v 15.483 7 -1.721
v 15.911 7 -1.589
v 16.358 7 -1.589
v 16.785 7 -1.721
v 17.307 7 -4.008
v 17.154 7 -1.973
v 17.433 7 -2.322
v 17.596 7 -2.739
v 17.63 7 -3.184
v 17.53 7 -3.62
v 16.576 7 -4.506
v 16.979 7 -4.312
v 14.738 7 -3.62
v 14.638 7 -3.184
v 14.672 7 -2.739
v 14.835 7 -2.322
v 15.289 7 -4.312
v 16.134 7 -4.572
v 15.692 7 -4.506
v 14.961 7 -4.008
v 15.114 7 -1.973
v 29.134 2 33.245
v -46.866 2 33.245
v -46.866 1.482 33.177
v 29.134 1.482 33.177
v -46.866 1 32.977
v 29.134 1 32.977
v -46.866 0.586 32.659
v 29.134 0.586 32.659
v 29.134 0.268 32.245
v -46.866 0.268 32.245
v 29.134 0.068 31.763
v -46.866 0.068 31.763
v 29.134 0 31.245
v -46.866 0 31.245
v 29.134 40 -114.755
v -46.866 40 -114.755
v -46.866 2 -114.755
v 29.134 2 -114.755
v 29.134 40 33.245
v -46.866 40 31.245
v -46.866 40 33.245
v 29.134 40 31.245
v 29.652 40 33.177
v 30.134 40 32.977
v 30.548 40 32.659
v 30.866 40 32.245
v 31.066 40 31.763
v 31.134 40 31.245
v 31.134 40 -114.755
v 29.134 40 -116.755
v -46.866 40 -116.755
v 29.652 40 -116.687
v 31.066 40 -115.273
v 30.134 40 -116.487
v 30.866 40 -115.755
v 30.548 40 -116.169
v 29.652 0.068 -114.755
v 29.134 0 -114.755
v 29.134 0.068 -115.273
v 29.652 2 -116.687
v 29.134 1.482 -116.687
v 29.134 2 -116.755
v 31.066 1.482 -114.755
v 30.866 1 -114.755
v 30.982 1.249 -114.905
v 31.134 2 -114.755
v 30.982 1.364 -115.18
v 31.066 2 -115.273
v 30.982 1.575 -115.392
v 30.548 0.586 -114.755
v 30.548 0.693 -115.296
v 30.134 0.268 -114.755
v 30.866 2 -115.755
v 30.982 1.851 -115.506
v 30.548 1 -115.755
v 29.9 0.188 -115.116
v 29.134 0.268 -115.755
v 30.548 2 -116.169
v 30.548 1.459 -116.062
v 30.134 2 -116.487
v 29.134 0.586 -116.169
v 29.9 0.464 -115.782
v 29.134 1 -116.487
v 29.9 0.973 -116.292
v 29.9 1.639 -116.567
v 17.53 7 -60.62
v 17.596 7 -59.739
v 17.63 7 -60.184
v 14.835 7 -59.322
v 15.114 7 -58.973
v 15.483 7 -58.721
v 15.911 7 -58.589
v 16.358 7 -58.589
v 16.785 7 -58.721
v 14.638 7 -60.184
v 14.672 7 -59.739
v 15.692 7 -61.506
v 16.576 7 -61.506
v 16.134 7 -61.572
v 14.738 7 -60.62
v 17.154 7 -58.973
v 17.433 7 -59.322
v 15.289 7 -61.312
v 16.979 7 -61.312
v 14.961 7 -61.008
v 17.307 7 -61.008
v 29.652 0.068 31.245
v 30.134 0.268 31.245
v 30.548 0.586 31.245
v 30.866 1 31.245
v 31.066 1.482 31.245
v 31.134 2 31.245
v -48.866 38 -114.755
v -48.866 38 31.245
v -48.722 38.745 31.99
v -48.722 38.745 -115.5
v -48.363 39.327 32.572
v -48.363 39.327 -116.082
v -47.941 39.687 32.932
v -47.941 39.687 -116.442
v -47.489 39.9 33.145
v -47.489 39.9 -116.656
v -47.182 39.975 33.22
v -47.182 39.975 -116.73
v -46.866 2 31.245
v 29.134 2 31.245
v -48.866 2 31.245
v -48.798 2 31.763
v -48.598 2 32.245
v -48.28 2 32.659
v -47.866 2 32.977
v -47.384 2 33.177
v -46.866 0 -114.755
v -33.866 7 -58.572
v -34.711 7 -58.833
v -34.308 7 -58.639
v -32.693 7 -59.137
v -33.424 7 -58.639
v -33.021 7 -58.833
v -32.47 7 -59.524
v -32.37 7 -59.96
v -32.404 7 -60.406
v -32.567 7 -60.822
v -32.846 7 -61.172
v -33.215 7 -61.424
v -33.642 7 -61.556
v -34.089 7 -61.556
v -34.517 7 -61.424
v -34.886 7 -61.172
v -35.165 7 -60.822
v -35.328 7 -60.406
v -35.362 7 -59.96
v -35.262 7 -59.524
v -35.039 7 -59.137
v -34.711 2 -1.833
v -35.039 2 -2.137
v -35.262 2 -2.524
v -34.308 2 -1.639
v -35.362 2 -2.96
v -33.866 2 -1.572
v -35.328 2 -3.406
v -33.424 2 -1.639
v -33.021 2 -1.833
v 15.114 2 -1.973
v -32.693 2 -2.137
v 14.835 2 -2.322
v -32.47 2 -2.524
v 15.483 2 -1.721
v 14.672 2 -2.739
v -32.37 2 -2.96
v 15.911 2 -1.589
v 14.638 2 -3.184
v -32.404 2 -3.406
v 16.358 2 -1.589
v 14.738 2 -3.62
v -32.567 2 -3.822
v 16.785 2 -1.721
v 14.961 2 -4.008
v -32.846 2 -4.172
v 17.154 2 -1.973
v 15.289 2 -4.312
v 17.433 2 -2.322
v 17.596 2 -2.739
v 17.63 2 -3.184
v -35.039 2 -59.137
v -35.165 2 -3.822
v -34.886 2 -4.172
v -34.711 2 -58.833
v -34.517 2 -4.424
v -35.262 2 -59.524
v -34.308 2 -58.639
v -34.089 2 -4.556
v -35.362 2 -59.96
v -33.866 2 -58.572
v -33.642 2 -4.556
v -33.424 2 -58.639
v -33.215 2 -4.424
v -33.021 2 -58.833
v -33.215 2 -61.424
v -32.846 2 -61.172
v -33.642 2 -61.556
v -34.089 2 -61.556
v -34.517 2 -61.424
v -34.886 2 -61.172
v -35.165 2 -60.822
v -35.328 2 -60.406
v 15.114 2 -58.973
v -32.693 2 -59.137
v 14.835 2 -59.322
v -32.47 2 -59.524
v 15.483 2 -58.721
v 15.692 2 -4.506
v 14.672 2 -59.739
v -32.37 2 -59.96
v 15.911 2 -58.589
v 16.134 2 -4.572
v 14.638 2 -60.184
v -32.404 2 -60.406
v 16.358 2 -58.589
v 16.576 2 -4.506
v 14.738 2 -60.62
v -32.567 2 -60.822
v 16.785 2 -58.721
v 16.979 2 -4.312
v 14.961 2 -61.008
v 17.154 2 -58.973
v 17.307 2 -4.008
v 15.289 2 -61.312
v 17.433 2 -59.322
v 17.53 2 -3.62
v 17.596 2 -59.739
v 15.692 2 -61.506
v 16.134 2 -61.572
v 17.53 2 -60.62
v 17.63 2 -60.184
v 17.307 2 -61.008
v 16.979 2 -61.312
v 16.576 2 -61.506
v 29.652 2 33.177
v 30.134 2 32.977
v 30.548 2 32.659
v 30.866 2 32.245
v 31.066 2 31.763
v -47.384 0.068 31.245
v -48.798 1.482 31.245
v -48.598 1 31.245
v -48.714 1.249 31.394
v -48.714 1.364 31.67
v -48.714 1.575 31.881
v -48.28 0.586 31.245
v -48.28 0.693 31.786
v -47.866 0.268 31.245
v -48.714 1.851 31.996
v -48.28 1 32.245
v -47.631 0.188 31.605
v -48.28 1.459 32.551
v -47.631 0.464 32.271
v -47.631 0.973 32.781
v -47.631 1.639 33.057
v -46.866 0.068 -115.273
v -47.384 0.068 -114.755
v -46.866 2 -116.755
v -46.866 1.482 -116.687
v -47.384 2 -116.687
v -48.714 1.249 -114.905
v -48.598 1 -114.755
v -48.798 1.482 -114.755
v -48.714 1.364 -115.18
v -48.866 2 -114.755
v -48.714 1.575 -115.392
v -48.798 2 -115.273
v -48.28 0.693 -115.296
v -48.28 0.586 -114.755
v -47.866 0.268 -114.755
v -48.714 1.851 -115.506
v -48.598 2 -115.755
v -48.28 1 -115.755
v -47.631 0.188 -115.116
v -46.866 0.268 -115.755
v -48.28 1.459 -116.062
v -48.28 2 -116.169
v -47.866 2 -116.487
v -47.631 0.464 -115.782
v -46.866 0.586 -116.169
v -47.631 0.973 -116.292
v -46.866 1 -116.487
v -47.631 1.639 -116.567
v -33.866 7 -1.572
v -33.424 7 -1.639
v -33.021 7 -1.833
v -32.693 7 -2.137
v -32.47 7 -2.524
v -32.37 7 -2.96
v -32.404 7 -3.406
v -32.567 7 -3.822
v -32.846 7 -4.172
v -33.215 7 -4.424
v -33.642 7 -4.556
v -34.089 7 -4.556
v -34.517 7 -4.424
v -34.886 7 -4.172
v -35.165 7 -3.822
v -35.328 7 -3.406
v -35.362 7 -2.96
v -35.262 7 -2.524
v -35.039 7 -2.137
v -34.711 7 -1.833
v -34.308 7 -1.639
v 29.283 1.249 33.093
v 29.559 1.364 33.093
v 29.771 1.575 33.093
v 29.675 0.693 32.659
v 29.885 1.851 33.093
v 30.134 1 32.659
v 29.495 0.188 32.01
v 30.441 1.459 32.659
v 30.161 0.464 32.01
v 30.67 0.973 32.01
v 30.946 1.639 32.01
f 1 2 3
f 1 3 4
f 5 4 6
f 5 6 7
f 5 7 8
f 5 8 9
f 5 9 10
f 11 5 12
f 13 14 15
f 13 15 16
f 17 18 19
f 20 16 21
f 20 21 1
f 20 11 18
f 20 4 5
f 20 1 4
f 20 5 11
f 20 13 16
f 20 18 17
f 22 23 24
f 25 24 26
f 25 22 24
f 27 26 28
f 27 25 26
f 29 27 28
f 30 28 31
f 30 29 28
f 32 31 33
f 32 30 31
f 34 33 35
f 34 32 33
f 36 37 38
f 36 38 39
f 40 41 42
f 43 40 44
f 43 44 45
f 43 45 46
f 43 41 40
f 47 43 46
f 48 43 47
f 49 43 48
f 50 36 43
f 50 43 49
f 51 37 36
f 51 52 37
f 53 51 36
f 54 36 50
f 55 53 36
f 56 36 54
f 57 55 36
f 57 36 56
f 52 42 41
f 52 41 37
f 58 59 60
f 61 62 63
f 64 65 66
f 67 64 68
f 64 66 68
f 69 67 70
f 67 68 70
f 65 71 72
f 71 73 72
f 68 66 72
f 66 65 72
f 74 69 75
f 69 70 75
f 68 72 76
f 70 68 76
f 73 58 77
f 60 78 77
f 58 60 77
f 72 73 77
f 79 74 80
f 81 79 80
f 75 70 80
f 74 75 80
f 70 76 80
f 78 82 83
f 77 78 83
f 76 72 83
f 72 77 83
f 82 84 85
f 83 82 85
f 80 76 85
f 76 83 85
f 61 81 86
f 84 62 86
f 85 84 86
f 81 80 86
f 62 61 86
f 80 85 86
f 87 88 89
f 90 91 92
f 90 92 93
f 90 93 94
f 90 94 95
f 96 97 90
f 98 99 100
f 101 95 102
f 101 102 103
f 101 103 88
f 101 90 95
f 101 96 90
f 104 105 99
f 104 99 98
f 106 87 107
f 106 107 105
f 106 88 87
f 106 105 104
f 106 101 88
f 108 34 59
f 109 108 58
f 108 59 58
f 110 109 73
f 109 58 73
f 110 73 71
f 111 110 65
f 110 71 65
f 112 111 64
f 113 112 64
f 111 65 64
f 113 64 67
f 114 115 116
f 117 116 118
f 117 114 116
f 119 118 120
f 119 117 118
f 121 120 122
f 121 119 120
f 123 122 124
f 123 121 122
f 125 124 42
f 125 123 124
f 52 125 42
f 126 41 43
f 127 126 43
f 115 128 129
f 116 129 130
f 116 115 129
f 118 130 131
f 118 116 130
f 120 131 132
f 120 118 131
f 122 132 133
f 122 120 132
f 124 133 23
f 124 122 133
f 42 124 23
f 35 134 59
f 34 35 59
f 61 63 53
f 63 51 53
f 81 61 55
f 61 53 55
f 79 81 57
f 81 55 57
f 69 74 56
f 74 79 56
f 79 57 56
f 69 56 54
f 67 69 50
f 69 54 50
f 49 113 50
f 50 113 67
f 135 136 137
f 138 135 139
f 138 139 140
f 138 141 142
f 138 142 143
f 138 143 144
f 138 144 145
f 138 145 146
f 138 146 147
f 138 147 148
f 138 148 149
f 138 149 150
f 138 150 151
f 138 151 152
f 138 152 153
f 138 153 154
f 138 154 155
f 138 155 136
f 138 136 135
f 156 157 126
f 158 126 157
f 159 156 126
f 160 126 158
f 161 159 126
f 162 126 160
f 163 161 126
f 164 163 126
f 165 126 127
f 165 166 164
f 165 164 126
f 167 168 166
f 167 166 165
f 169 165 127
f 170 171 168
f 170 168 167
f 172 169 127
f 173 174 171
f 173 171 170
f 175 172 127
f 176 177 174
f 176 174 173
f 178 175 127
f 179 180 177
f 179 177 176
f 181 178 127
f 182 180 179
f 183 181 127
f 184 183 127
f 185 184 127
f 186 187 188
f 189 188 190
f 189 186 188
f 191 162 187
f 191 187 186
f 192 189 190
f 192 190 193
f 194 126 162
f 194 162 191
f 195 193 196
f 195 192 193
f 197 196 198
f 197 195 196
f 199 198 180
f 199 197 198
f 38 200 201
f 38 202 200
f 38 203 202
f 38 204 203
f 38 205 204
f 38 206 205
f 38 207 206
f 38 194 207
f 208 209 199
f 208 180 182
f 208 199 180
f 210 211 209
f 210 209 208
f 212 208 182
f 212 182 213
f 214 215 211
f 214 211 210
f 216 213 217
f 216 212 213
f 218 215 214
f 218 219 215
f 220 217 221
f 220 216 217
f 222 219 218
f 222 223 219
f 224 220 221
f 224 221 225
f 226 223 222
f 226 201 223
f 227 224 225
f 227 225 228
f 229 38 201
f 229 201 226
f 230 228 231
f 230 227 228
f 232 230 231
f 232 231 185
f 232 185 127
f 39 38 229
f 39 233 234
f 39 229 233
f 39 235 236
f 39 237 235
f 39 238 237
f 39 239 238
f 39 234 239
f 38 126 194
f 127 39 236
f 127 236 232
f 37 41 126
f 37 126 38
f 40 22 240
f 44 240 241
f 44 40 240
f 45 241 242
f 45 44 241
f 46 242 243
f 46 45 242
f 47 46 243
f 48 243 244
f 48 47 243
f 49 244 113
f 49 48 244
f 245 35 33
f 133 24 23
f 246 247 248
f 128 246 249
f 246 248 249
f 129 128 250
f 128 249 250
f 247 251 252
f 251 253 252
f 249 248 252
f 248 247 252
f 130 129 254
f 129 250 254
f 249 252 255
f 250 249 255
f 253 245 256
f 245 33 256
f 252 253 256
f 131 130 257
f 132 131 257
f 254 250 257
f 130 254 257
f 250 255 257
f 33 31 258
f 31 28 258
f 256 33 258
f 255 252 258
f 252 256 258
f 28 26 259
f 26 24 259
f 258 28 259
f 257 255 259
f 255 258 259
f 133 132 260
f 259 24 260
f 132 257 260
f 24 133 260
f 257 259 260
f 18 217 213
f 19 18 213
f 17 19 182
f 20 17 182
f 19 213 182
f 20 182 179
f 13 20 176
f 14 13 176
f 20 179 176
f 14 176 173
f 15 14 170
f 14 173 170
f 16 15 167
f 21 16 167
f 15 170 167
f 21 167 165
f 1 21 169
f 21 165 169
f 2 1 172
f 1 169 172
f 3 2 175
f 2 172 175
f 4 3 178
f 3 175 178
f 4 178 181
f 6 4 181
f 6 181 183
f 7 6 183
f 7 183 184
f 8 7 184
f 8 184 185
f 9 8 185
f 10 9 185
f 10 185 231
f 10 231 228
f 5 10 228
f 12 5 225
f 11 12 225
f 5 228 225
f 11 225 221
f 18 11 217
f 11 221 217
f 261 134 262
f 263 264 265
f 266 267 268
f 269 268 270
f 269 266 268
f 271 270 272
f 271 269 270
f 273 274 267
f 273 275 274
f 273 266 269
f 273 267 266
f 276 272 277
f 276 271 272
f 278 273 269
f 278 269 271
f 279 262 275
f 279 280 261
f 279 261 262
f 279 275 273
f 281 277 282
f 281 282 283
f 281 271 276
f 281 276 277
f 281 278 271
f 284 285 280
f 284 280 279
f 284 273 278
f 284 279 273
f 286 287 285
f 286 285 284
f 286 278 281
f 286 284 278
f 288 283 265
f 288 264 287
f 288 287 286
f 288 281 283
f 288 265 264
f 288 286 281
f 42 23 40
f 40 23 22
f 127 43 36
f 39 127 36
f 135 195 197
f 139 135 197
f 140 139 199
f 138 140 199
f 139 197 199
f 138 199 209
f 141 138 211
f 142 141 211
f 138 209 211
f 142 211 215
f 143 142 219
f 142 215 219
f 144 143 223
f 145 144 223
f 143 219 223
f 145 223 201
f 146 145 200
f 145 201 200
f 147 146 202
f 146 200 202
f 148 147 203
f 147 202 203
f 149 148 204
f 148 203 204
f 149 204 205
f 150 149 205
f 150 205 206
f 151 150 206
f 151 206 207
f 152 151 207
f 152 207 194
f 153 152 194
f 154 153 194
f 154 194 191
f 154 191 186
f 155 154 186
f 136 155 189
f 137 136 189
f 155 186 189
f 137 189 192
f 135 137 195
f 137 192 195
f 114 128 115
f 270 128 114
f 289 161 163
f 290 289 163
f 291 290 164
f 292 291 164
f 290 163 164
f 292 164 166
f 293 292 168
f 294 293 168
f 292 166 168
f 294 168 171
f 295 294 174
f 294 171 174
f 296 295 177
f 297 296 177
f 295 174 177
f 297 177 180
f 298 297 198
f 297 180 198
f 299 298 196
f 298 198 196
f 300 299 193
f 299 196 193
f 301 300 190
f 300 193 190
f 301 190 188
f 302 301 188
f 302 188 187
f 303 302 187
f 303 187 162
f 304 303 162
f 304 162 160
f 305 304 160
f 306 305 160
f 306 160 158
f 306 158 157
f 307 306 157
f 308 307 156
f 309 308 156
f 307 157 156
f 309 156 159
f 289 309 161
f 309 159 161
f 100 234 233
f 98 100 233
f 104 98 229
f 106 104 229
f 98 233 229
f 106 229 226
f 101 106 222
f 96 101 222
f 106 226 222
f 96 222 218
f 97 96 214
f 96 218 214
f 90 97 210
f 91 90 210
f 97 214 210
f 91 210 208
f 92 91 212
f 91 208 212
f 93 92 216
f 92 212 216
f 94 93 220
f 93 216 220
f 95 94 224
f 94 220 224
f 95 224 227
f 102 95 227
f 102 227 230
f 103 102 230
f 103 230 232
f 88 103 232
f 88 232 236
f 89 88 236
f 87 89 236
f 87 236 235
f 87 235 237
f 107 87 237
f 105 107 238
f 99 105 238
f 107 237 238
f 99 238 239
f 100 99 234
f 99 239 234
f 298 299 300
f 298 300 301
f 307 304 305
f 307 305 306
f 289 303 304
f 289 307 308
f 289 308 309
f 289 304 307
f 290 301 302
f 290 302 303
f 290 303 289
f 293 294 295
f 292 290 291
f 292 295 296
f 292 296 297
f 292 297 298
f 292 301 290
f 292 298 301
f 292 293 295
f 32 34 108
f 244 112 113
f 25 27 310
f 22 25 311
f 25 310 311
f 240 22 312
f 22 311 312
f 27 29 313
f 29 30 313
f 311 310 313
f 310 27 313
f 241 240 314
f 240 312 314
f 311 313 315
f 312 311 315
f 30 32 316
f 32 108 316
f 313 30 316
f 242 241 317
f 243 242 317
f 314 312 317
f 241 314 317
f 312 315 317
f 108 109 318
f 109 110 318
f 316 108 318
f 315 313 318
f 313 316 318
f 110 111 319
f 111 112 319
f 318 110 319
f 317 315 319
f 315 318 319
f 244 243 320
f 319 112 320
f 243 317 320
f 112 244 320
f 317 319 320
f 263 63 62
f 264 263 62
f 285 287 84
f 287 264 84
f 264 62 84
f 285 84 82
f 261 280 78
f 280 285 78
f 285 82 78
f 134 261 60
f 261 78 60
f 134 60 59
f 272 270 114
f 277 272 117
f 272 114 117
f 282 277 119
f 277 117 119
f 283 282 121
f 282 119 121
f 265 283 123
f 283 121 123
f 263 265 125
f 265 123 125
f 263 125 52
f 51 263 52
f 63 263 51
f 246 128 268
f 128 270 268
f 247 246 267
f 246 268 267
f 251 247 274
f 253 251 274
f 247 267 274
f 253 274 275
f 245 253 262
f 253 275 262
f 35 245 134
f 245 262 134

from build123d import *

# Parameters (mm, degrees)
SKETCH1_W           = 80
SKETCH1_H           = 150
BOSS_EXTRUDE1_DEPTH = 40
SKETCH2_W           = 76
SKETCH2_H           = 146
CUT_EXTRUDE1_DEPTH  = 38
SKETCH4_R           = 1.5
BOSS_EXTRUDE3_DEPTH = 5
FILLET1_R           = 2


with BuildPart() as part:
    # Sketch1 → Boss-Extrude1 (new body)
    with BuildSketch(Plane(origin=(0, 0, 0), x_dir=(1, 0, 0), z_dir=(0, 1, 0))):
        with Locations((-8.86592033, 41.755152562)):
            Rectangle(SKETCH1_W, SKETCH1_H)
    extrude(amount=BOSS_EXTRUDE1_DEPTH)

    # Sketch2 → Cut-Extrude1 (cut)
    with BuildSketch(Plane(origin=(0, 40, 0), x_dir=(1, 0, 0), z_dir=(0, 1, 0))):
        with Locations((-8.86592033, 41.755152562)):
            Rectangle(SKETCH2_W, SKETCH2_H)
    extrude(amount=-CUT_EXTRUDE1_DEPTH, mode=Mode.SUBTRACT)

    # Sketch4 → Boss-Extrude3 (add)
    with BuildSketch(Plane(origin=(0, 2, 0), x_dir=(1, 0, 0), z_dir=(0, 1, 0))):
        with Locations(Location((-33.86592033, 60.072338785, 0), (0, 0, 270))):
            Circle(SKETCH4_R)
        with Locations(Location((-33.86592033, 3.072338785, 0), (0, 0, 270))):
            Circle(SKETCH4_R)
        with Locations(Location((16.13407967, 60.072338785, 0), (0, 0, 90))):
            Circle(SKETCH4_R)
        with Locations(Location((16.13407967, 3.072338785, 0), (0, 0, 90))):
            Circle(SKETCH4_R)
    extrude(amount=BOSS_EXTRUDE3_DEPTH)

    # Fillet1
    fillet1_edges = [part.edges().sort_by_distance(p)[0] for p in [
        (-48.86592033, 40, -41.755152562),
        (-8.86592033, 0, -116.755152562),
        (31.13407967, 0, -41.755152562),
        (-8.86592033, 0, 33.244847438),
        (-48.86592033, 0, -41.755152562),
        (-48.86592033, 20, -116.755152562),
        (31.13407967, 20, -116.755152562),
        (31.13407967, 20, 33.244847438),
        (-48.86592033, 20, 33.244847438),
    ]]
    fillet(fillet1_edges, radius=FILLET1_R - 0.0001)  # a hair under: the kernel refuses the full size


solid = part.part
